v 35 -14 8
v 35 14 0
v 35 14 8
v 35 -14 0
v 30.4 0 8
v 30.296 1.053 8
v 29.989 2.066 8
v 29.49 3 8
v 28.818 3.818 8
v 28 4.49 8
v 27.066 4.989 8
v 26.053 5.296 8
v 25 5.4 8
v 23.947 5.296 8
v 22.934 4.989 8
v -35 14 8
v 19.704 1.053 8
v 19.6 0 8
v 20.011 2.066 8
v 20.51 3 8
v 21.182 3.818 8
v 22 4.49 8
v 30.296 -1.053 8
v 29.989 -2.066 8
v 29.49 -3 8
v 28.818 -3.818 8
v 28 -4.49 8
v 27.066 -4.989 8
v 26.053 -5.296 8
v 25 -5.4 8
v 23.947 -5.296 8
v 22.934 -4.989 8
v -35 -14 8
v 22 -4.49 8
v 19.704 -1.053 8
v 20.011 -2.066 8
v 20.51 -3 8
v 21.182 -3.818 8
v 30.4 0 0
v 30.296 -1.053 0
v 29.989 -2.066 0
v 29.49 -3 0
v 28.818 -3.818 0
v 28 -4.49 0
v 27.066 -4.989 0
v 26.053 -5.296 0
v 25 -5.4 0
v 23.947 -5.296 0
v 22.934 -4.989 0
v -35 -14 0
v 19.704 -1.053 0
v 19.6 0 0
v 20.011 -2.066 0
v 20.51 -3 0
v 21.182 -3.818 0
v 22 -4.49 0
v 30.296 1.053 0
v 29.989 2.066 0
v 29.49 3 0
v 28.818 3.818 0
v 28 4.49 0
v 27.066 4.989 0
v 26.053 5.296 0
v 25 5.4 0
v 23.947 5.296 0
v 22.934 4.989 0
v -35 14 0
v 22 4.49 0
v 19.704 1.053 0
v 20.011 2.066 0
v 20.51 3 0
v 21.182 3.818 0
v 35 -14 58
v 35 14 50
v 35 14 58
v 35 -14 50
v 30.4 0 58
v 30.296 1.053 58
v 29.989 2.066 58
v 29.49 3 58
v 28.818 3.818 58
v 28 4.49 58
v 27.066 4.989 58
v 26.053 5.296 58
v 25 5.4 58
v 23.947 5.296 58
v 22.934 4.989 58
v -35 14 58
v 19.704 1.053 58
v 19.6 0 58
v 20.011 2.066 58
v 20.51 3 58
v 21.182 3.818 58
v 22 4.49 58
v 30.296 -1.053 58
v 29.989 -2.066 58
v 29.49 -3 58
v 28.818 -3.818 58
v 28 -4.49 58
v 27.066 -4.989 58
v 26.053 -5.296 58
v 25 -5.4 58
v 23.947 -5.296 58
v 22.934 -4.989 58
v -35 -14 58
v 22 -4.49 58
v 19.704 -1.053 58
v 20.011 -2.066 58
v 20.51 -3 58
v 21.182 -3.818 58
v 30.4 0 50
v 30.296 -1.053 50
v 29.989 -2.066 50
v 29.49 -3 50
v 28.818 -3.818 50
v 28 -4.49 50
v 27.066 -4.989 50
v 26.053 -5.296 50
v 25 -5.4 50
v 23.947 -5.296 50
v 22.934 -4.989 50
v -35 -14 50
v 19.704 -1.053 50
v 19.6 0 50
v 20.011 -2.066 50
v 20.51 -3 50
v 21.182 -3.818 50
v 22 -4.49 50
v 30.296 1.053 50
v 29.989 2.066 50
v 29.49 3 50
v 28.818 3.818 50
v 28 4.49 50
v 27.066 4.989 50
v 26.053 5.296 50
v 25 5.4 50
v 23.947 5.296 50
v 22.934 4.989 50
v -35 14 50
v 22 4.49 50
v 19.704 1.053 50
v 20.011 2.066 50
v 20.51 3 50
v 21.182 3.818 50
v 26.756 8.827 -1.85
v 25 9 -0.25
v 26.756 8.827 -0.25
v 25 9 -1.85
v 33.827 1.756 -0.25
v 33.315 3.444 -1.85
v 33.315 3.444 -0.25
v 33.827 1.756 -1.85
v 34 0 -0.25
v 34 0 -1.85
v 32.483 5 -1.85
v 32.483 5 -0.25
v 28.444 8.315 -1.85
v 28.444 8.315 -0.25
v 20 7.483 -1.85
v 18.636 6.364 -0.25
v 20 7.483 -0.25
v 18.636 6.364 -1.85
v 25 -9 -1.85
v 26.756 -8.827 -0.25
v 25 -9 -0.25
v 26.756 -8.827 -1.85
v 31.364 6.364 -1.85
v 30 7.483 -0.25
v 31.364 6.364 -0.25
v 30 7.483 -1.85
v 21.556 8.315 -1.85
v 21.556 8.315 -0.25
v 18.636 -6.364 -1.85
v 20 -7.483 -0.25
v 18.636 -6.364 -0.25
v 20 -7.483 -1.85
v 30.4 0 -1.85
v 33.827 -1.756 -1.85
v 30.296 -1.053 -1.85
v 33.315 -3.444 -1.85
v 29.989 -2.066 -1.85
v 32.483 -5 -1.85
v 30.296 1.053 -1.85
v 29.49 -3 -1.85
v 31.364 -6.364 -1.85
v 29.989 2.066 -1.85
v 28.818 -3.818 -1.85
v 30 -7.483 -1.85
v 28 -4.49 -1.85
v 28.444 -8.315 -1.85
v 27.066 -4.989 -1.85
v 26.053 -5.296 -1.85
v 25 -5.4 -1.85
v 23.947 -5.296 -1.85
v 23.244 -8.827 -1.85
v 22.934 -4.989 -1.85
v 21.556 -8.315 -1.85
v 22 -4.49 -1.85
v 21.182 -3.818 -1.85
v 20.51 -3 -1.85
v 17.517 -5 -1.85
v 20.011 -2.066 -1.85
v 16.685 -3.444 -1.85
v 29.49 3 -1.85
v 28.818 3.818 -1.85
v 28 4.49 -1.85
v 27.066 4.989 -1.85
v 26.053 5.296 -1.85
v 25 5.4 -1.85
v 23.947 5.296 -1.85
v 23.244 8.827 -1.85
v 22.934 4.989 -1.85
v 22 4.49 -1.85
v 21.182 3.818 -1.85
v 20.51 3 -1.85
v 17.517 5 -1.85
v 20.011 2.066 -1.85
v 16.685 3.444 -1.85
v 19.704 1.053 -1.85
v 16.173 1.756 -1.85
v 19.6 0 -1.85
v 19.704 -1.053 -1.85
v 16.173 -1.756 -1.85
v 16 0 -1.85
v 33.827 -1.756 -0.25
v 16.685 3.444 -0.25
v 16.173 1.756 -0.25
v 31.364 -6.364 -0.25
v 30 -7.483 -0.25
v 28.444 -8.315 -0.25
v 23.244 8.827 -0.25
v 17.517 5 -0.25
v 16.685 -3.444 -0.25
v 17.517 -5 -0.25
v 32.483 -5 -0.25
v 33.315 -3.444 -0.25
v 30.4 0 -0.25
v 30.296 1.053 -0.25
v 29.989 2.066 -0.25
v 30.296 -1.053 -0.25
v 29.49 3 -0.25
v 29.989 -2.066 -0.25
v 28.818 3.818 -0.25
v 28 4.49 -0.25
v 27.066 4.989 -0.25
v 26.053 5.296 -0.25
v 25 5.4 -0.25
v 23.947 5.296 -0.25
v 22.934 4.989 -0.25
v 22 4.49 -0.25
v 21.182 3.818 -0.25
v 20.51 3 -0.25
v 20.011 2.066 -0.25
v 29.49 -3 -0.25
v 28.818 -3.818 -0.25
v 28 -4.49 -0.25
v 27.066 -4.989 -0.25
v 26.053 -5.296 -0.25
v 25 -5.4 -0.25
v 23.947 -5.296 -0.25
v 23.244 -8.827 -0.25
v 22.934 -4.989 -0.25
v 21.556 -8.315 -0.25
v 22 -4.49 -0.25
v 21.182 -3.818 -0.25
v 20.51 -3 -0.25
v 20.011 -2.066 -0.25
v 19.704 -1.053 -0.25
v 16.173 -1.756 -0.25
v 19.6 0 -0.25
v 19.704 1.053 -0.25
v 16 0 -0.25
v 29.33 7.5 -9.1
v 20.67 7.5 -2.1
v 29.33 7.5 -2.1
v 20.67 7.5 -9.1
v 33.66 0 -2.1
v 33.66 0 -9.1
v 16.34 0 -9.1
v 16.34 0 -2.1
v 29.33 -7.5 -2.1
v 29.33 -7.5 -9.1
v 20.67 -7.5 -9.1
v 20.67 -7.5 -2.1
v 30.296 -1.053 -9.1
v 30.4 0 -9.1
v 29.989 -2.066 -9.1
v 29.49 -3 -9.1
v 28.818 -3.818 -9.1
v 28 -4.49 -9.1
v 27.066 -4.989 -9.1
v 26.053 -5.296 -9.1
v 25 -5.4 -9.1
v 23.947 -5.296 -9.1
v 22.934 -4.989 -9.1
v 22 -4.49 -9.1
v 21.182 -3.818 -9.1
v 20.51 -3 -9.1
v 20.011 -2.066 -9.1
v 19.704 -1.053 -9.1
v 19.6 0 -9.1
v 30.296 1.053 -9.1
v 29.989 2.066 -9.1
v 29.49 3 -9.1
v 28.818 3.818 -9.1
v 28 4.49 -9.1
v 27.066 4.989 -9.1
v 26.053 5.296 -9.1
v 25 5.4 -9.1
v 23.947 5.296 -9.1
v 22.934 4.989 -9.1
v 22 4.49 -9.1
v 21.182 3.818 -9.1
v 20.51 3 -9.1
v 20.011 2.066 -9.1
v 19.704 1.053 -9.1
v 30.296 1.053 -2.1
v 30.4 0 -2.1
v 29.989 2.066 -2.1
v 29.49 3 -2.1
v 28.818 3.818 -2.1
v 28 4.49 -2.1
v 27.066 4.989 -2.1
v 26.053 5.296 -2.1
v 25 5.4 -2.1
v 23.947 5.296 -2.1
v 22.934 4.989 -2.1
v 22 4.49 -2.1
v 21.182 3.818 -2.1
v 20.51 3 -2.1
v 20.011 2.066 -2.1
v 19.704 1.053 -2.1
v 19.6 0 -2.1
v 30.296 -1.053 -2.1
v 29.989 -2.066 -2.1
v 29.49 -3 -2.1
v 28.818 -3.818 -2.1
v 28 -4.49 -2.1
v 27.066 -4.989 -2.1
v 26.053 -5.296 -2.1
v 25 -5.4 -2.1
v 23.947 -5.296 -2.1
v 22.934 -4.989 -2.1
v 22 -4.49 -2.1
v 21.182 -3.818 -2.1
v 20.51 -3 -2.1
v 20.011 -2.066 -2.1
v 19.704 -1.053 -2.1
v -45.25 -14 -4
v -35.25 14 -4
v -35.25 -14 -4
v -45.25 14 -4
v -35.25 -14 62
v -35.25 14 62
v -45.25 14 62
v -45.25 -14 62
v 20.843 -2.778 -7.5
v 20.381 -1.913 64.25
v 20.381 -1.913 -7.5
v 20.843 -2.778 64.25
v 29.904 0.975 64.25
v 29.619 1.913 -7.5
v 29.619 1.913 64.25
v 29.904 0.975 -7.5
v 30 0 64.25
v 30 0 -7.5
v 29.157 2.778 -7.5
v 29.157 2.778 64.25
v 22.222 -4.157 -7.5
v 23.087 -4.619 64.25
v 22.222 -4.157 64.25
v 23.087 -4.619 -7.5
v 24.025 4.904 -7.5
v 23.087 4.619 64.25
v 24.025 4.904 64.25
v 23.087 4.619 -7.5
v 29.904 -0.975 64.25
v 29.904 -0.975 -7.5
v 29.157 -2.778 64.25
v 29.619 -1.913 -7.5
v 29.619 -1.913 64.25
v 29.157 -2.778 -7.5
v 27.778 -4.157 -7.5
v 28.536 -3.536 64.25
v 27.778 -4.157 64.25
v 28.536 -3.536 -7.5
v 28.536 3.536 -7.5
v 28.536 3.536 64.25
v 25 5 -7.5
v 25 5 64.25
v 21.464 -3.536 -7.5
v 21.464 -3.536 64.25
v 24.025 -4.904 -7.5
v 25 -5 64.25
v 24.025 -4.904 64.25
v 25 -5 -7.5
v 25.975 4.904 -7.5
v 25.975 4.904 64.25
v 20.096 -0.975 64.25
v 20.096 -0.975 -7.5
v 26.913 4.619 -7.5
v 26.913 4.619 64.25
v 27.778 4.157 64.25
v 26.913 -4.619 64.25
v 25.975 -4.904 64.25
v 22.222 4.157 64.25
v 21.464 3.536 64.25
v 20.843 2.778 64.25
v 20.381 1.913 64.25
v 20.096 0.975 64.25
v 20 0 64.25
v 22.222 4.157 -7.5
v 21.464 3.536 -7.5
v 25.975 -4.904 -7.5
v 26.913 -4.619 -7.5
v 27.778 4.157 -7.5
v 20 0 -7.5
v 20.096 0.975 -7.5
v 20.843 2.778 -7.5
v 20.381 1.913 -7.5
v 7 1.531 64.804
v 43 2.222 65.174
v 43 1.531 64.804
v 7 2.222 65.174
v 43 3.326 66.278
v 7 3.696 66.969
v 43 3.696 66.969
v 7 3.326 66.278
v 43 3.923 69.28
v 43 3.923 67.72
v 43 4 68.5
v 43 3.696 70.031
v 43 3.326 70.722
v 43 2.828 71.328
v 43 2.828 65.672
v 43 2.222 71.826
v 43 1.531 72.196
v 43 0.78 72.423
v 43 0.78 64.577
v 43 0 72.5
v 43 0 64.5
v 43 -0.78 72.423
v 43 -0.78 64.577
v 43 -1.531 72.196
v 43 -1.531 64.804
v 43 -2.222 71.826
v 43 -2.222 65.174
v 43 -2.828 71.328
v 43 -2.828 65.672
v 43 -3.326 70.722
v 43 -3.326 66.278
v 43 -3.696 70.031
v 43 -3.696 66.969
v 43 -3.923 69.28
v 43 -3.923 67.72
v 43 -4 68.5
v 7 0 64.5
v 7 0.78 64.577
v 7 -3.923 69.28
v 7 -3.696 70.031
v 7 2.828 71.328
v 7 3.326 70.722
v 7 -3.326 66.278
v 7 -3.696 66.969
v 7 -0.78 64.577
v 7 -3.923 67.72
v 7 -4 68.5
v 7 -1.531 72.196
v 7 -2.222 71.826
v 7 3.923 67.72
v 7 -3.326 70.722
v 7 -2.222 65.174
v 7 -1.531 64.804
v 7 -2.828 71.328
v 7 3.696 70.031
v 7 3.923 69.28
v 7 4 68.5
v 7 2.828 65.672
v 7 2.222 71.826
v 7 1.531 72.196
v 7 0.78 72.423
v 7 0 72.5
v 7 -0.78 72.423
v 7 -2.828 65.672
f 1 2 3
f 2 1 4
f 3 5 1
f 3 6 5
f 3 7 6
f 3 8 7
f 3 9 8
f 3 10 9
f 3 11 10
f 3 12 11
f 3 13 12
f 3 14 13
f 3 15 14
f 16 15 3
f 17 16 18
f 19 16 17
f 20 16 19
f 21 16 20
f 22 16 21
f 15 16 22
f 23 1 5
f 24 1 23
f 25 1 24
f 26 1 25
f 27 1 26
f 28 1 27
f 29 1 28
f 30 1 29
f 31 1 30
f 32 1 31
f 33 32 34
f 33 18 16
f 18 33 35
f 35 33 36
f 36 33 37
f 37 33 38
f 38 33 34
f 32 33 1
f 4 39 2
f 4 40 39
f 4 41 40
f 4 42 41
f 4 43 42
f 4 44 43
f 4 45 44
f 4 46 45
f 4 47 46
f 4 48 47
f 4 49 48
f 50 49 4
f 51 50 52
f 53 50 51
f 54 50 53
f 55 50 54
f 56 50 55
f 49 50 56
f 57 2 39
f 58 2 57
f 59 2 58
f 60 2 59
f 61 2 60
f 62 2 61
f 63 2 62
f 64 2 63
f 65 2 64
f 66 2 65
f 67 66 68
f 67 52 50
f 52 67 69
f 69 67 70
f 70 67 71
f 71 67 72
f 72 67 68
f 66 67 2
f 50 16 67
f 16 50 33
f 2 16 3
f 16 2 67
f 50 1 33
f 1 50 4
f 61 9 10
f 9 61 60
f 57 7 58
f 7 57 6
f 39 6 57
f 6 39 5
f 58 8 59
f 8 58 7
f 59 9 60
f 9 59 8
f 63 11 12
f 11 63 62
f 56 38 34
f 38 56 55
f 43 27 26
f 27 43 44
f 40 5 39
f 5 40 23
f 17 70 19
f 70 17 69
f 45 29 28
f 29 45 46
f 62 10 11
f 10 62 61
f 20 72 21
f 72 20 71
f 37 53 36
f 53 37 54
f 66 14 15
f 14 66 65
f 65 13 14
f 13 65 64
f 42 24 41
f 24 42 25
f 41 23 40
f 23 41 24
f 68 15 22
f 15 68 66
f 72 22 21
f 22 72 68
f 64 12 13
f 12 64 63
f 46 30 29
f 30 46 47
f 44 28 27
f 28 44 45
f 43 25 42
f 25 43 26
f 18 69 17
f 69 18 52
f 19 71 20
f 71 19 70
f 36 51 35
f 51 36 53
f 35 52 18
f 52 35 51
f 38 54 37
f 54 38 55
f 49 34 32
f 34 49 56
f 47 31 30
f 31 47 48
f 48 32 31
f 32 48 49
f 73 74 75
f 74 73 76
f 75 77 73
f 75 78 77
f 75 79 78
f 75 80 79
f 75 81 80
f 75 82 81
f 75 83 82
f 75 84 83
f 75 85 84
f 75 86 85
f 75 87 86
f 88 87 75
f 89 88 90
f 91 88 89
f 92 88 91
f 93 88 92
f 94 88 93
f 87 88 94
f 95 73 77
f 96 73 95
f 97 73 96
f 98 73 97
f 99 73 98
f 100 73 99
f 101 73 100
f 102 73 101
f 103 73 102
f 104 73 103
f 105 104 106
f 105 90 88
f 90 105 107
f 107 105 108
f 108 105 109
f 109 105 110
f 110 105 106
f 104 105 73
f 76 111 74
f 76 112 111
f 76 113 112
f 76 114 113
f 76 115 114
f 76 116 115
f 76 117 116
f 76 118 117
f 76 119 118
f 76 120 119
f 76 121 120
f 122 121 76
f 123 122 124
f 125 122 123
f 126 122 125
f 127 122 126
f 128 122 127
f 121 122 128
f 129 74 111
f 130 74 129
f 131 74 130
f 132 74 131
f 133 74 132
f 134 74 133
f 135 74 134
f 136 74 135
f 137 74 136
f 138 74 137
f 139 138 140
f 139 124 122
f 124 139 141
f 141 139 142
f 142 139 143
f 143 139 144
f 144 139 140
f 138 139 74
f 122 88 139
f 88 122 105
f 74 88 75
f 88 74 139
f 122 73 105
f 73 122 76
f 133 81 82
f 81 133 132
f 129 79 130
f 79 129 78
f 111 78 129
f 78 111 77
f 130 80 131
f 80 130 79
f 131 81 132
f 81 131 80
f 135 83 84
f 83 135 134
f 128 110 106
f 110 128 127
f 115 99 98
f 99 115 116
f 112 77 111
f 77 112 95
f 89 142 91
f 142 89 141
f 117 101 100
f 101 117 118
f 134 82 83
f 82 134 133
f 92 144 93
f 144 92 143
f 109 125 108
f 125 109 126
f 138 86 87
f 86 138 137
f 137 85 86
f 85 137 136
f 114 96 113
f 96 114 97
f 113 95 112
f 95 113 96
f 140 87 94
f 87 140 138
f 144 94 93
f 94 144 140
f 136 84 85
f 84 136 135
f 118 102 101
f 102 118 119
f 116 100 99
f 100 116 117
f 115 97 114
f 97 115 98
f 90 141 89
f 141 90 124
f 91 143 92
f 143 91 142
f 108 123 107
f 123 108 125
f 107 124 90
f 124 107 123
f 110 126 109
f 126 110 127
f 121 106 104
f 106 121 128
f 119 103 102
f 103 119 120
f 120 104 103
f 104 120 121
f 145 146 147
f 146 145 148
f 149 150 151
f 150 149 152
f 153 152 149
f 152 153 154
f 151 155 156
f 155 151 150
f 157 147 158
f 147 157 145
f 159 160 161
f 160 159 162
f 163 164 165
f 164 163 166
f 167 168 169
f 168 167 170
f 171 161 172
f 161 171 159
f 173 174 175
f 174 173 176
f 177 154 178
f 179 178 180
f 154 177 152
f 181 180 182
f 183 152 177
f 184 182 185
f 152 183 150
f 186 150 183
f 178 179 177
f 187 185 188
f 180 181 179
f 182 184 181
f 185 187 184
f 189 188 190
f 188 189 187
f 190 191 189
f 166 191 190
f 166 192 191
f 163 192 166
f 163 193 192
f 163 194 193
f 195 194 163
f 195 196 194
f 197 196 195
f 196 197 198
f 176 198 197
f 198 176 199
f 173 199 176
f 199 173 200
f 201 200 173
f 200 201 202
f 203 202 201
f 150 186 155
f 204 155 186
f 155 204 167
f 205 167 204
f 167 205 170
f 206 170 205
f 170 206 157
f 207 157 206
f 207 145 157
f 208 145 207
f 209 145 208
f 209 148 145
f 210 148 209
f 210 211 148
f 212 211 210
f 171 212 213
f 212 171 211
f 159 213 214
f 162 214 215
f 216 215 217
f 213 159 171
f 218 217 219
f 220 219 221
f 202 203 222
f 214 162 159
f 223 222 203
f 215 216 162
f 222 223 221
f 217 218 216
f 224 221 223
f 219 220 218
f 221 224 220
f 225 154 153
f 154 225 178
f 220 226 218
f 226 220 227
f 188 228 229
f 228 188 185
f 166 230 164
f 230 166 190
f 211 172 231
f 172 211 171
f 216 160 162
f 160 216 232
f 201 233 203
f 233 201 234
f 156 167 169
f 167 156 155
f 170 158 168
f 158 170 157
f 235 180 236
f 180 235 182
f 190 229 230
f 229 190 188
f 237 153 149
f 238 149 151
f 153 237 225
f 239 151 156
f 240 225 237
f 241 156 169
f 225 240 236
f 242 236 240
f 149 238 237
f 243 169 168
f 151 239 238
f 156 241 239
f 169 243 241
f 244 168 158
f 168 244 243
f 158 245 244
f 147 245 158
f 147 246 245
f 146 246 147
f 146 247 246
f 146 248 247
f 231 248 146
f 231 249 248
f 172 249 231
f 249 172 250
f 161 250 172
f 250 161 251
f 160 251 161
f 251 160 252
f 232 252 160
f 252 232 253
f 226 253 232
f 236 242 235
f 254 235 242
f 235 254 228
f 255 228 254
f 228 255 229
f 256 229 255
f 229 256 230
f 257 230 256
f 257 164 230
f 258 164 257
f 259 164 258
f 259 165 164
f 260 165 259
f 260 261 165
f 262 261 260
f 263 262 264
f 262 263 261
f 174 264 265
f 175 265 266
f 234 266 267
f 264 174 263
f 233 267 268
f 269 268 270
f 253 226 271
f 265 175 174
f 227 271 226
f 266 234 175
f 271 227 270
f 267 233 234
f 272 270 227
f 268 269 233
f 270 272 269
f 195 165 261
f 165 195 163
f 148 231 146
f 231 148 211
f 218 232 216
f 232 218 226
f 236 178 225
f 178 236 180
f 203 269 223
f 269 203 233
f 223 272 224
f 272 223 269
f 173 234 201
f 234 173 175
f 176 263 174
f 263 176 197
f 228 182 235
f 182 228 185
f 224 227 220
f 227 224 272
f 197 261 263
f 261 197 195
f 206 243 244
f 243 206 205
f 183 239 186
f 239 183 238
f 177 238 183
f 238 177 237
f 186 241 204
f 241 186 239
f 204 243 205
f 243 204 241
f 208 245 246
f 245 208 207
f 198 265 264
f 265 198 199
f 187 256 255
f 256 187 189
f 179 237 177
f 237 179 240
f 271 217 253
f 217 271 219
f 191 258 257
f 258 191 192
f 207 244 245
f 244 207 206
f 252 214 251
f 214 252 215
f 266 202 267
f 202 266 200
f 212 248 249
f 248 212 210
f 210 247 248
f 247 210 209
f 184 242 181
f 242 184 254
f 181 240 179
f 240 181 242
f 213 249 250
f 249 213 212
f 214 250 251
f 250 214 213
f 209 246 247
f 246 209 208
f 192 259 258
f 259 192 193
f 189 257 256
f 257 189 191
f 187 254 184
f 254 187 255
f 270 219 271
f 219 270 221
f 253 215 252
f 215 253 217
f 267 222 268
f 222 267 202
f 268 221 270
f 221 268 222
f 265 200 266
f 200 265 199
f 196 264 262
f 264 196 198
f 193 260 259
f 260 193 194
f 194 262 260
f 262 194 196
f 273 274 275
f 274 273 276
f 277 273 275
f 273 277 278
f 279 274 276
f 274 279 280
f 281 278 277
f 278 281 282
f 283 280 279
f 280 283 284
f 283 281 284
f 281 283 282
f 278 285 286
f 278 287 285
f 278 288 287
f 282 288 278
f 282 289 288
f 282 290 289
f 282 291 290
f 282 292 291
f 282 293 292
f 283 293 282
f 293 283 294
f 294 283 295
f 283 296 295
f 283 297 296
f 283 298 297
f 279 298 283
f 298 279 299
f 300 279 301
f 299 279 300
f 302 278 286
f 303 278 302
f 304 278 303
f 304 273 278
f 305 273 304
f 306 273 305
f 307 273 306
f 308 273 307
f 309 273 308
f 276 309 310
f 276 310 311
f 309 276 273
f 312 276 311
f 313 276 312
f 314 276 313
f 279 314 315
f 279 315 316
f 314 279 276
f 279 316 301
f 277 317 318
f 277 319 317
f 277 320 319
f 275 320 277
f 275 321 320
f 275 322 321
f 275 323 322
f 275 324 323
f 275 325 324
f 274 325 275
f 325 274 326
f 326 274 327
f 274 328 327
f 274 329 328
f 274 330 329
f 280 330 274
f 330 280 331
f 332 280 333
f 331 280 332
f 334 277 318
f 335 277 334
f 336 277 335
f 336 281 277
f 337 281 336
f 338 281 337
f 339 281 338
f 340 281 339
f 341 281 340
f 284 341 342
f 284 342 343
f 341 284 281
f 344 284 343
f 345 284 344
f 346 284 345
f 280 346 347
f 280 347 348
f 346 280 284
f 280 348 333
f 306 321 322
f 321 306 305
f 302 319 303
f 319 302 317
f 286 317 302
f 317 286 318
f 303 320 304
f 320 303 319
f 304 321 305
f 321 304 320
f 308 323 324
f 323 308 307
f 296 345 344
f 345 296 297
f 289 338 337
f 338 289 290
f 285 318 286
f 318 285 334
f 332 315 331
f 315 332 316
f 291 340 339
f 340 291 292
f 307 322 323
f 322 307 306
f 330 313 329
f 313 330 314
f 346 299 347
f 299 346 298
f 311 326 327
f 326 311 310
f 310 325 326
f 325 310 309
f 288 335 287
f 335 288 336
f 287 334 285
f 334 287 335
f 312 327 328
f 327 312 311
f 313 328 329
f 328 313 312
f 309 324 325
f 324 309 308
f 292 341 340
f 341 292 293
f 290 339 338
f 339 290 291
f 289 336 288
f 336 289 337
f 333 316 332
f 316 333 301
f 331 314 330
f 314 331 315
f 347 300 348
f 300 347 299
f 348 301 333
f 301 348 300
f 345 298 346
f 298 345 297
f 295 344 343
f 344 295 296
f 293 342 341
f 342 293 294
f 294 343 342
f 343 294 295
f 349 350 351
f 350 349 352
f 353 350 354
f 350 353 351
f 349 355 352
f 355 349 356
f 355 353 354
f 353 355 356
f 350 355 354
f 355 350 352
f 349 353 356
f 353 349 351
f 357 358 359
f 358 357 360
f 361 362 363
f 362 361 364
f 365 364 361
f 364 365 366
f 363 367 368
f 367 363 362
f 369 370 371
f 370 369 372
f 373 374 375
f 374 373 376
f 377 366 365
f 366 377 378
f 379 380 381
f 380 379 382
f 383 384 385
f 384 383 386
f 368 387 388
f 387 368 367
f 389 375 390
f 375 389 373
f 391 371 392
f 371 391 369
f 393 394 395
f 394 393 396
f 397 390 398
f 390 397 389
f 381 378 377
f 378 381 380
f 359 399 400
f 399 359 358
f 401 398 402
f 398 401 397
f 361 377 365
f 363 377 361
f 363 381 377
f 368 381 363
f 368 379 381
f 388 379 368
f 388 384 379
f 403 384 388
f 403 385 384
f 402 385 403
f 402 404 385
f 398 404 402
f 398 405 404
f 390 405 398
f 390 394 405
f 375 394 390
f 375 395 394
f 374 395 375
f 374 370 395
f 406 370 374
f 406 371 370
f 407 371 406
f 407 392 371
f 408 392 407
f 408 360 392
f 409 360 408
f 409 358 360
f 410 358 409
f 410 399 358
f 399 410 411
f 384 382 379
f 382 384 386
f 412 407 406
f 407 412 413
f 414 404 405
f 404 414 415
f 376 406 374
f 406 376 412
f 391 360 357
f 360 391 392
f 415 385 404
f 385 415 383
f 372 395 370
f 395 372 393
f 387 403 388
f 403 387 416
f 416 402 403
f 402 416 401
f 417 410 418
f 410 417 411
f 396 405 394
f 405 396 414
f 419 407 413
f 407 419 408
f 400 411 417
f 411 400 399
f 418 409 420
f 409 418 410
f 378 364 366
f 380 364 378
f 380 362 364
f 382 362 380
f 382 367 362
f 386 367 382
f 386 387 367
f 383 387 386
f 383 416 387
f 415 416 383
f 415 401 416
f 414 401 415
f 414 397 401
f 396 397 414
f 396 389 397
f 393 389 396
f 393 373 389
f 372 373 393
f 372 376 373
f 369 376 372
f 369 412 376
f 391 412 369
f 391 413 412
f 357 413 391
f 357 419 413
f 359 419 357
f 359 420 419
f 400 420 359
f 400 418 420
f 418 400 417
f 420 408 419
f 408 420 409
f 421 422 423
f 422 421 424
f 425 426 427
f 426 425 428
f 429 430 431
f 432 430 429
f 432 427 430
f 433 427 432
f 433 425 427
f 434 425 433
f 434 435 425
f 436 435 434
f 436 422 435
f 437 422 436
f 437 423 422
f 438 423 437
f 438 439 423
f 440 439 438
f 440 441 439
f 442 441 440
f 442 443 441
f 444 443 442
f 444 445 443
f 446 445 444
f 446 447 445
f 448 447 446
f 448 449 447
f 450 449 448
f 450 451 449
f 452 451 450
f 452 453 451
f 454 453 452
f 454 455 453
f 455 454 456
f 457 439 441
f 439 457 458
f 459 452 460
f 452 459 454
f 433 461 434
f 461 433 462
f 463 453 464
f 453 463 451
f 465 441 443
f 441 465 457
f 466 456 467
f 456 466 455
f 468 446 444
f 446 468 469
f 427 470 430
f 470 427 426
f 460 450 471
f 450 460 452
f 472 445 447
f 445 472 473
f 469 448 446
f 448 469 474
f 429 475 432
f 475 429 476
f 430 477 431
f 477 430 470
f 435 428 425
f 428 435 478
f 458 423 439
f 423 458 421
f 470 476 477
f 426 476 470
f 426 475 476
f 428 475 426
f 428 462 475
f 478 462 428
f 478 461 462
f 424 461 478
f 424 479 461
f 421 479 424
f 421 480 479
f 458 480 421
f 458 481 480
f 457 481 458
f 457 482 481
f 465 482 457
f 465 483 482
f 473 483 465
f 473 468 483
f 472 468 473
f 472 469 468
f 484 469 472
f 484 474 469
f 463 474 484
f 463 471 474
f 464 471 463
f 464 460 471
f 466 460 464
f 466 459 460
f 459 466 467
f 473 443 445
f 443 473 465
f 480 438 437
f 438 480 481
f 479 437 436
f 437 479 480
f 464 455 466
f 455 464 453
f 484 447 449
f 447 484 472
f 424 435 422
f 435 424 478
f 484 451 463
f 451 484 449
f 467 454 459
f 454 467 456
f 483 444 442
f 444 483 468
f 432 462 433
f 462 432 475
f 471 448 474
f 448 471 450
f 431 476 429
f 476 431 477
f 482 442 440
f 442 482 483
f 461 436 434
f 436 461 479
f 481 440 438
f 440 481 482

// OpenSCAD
$fn = 32;

// ------------------------------------------------------------------------
// C clamp: throat 50 mm, screw d10
// Every part is its own module, assembly() places every instance.
// ------------------------------------------------------------------------

// --- part 1 ---
module clamp_arm() {
  difference() {
    translate([-35, -14, 0]) cube([70, 28, 8]);
    translate([25, 0, -1]) cylinder(h = 10, d = 10.8);
  }
}

// --- part 2 ---
module clamp_spine() {
  difference() {
    translate([-33, -14, 0]) cube([66, 28, 10]);
  }
}

// --- part 3 ---
module clamp_screw() {
  translate([0, 0, -35.875]) cylinder(h = 71.75, d = 10);
}

// --- part 4 ---
module clamp_washer() {
  difference() {
      translate([0, 0, 0]) cylinder(h = 1.6, d = 18);
      translate([0, 0, -1]) cylinder(h = 3.6, d = 10.8);
    }
}

// --- part 5 ---
module clamp_nut() {
  difference() {
    linear_extrude(height = 7) polygon(points = [[8.66, 0], [4.33, 7.5], [-4.33, 7.5], [-8.66, 0], [-4.33, -7.5], [4.33, -7.5]]);
    translate([0, 0, -1]) cylinder(h = 9, d = 10.8);
  }
}

// --- part 6 ---
module tommy_bar() {
  translate([0, 0, -18]) cylinder(h = 36, d = 8);
}

// --- assembly ---
module assembly() {
  color([0.80, 0.24, 0.20]) translate([0, 0, 0]) rotate([0, 0, 0]) clamp_arm();
  color([0.20, 0.45, 0.75]) translate([0, 0, 50]) rotate([0, 0, 0]) clamp_arm();
  color([0.25, 0.62, 0.32]) translate([-45.25, 0, 29]) rotate([0, 90, 0]) clamp_spine();
  color([0.92, 0.70, 0.18]) translate([25, 0, 28.375]) rotate([0, 0, 0]) clamp_screw();
  color([0.58, 0.35, 0.70]) translate([25, 0, -1.85]) rotate([0, 0, 0]) clamp_washer();
  color([0.16, 0.66, 0.66]) translate([25, 0, -9.1]) rotate([0, 0, 0]) clamp_nut();
  color([0.85, 0.48, 0.18]) translate([25, 0, 68.5]) rotate([0, 90, 0]) tommy_bar();
}

assembly();
